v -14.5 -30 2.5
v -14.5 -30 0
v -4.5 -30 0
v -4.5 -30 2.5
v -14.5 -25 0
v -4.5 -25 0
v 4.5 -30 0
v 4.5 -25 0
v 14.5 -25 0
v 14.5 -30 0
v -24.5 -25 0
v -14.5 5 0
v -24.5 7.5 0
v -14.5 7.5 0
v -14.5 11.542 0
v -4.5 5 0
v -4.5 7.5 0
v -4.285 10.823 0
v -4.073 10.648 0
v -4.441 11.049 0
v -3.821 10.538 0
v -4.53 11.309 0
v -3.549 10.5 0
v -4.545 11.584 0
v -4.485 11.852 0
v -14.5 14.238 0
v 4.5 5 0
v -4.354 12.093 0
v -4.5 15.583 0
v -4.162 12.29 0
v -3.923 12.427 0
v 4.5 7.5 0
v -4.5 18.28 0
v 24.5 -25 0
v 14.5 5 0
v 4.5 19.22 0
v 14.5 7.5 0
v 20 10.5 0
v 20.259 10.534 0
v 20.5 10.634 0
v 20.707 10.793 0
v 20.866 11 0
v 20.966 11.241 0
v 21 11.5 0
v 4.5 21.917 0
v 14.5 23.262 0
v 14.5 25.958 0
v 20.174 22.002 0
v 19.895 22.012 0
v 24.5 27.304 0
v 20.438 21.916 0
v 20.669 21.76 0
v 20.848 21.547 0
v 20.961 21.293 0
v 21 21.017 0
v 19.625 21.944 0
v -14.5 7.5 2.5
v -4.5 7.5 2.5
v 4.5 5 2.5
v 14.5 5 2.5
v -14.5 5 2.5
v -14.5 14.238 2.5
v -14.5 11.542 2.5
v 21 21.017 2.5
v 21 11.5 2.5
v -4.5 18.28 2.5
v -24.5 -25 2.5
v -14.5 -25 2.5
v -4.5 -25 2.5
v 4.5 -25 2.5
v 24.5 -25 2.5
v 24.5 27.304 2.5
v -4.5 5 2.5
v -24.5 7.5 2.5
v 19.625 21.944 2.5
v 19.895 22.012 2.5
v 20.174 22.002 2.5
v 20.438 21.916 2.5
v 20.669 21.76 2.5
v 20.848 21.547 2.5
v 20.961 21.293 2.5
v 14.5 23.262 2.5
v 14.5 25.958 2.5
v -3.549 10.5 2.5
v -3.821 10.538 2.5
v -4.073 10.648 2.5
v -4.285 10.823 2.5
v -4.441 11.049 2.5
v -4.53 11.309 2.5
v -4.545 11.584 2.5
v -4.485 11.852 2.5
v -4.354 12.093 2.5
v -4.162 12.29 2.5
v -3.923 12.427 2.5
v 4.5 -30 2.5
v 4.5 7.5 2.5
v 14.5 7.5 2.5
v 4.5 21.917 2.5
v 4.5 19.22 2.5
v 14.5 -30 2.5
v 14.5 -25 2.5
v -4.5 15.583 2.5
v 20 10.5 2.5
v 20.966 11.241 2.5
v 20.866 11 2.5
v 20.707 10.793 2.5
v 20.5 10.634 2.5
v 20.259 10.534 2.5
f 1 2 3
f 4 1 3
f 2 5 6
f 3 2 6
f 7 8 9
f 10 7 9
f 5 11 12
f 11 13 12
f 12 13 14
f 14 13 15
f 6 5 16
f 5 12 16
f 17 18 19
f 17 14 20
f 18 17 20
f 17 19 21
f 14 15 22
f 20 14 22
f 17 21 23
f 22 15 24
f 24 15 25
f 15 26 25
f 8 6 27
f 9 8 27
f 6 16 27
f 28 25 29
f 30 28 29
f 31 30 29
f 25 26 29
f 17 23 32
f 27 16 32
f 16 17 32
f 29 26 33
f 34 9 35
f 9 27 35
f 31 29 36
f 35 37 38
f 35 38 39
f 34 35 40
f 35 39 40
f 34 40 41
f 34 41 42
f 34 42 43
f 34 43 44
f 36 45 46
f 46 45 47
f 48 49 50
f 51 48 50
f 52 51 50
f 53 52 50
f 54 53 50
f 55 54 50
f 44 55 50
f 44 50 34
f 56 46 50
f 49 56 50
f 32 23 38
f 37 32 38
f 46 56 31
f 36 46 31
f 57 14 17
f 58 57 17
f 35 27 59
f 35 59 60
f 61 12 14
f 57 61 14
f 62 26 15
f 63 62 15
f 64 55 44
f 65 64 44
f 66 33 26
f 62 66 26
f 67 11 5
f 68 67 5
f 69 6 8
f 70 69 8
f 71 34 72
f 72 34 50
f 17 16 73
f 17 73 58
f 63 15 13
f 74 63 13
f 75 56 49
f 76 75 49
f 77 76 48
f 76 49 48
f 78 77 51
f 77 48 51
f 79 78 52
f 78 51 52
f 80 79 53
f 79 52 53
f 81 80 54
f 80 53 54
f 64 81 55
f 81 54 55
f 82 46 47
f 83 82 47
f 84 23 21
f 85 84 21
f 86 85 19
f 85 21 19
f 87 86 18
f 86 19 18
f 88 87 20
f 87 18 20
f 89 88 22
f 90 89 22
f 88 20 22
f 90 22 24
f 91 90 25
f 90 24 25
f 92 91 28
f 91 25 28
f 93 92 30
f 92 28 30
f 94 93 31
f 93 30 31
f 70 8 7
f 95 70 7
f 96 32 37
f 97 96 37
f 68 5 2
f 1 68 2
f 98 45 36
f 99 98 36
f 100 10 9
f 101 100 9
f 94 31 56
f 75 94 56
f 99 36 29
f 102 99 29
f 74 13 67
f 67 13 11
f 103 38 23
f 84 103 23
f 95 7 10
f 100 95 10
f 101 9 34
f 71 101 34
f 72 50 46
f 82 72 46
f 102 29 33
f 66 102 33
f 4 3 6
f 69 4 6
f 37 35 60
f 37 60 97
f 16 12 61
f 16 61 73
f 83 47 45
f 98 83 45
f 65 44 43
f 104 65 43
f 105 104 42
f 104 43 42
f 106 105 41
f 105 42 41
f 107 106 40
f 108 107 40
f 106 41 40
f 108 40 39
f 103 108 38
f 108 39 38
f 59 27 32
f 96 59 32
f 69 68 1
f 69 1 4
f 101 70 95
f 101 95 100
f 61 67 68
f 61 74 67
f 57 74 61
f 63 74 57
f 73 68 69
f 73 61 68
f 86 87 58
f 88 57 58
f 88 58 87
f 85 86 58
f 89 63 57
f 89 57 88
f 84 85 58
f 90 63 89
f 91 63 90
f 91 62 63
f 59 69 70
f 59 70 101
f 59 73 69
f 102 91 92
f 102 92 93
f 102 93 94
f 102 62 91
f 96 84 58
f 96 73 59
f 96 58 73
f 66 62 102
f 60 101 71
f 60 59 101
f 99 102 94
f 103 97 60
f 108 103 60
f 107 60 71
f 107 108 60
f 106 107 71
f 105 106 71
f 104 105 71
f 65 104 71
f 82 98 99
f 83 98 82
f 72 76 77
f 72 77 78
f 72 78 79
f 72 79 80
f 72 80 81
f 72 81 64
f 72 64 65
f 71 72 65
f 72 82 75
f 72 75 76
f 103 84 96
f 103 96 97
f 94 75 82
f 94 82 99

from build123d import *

# Parameters (mm, degrees)
SKETCH1_W           = 10
SKETCH1_H           = 2.5
BOSS_EXTRUDE1_DEPTH = 2.5


with BuildPart() as part:
    # Sketch1 → Boss-Extrude1 (new body)
    with BuildSketch(Plane.XY):
        Polygon((-24.5, -25), (-14.5, -25), (-14.5, -30), (-4.5, -30), (-4.5, -25), (4.5, -25), (4.5, -30), (14.5, -30), (14.5, -25), (24.5, -25), (24.5, 27.303543512), (14.5, 23.26200402), (14.5, 25.958460508), (4.5, 21.916921016), (4.5, 19.220464528), (-4.5, 15.583078984), (-4.5, 18.279535472), (-14.5, 14.23799598), (-14.5, 11.541539492), (-24.5, 7.5), align=None)
        with Locations((-9.5, 6.25)):
            Rectangle(SKETCH1_W, SKETCH1_H, mode=Mode.SUBTRACT)
        with Locations((9.5, 6.25)):
            Rectangle(SKETCH1_W, SKETCH1_H, mode=Mode.SUBTRACT)
        with BuildLine():
            Line((21, 21.017263456), (21, 11.5))
            ThreePointArc((21, 11.5), (20.707106781, 10.792893219), (20, 10.5))
            Line((20, 10.5), (-3.54860932, 10.5))
            ThreePointArc((-3.54860932, 10.5), (-4.530226027, 11.309137116), (-3.923317712, 12.427142719))
            Line((-3.923317712, 12.427142719), (19.625291609, 21.944406175))
            ThreePointArc((19.625291609, 21.944406175), (20.559147391, 21.846331725), (21, 21.017263456))
        make_face(mode=Mode.SUBTRACT)
    extrude(amount=BOSS_EXTRUDE1_DEPTH)


solid = part.part
